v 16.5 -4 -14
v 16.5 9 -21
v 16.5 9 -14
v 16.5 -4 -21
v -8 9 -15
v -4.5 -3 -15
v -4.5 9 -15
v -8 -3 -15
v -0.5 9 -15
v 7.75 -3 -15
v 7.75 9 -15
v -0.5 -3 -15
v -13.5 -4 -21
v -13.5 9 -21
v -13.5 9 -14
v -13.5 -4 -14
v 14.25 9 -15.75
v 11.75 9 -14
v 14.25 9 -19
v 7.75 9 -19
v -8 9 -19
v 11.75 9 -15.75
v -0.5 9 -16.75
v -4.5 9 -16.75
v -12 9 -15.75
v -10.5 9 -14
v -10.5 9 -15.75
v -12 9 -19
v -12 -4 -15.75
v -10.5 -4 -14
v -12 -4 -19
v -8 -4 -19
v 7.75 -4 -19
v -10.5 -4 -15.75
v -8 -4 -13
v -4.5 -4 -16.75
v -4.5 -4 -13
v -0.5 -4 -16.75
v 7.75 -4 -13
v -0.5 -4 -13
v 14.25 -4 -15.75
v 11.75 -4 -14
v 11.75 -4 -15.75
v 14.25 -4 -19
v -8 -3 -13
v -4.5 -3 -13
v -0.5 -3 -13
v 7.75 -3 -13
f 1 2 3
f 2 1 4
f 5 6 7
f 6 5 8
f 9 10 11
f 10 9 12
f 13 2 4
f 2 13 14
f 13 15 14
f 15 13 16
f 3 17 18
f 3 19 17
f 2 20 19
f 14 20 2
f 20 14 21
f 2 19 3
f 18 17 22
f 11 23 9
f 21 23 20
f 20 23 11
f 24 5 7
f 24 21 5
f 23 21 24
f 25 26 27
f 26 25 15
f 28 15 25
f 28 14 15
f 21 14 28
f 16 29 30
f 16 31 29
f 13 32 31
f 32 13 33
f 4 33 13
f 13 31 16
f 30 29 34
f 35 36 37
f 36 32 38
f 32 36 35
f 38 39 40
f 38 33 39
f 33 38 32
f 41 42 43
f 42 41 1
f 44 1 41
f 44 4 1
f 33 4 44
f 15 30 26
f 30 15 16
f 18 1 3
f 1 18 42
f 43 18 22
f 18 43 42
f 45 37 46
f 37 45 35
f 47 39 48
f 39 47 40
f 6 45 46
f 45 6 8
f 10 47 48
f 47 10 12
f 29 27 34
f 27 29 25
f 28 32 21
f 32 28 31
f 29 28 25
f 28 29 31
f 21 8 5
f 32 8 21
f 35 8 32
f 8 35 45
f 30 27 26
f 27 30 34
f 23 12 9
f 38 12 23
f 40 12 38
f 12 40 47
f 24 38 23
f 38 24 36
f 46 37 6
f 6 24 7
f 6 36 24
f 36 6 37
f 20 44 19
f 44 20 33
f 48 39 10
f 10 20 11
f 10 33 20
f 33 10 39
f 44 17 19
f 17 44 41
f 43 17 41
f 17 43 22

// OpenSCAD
module lichtschranke_halterung(h=0) {
	translate([-(2 + 1 + 2.5 + 4 + 4), -2 - 3, -14 - 5]) difference() {
		union() {
			difference() {
				translate([0, 1, -2 - h]) cube([30, 13, 6 + h]);
				translate([2, 0, -3 - h]) cube([30 - 2*2, 15, h]);
			}
			
			translate([0, 1, -1]) cube([5, 13, 6]);
			translate([2 + 1 + 2.5 + 3.75 + 3.5 + 12.5, 1, -1]) cube([4.75, 13, 6]);
			
			translate([5, 1, -1]) cube([20, 1, 7]);
		}

		translate([2 - 0.5, 0, 0]) cube([3.5, 15, 3.25]);
		translate([2 + 1, 0, 0]) cube([2.5, 15, 7]);

		translate([2 + 1 + 2.5 + 3.5, 0, 2.25]) cube([4, 15, 4]);

		translate([2 + 1 + 2.5 + 3.75 + 3.5 + 12.5 - 4, 0, 0]) cube([4, 15, 7]);
		translate([2 + 1 + 2.5 + 3.75 + 3.5 + 12.5, 0, 0]) cube([2.5, 15, 3.25]);
	}
	% translate([2.5, -3, 0]) cube([5, 7, 4.2]);
	% translate([-2.5 - 5, -3, 0]) cube([5, 7, 4.2]);
	% translate([2.5, -3, -14]) cube([5, 7, 13.8]);
	% translate([-2.5 - 5, -3, -14]) cube([5, 7, 13.8]);
}

lichtschranke_halterung();
